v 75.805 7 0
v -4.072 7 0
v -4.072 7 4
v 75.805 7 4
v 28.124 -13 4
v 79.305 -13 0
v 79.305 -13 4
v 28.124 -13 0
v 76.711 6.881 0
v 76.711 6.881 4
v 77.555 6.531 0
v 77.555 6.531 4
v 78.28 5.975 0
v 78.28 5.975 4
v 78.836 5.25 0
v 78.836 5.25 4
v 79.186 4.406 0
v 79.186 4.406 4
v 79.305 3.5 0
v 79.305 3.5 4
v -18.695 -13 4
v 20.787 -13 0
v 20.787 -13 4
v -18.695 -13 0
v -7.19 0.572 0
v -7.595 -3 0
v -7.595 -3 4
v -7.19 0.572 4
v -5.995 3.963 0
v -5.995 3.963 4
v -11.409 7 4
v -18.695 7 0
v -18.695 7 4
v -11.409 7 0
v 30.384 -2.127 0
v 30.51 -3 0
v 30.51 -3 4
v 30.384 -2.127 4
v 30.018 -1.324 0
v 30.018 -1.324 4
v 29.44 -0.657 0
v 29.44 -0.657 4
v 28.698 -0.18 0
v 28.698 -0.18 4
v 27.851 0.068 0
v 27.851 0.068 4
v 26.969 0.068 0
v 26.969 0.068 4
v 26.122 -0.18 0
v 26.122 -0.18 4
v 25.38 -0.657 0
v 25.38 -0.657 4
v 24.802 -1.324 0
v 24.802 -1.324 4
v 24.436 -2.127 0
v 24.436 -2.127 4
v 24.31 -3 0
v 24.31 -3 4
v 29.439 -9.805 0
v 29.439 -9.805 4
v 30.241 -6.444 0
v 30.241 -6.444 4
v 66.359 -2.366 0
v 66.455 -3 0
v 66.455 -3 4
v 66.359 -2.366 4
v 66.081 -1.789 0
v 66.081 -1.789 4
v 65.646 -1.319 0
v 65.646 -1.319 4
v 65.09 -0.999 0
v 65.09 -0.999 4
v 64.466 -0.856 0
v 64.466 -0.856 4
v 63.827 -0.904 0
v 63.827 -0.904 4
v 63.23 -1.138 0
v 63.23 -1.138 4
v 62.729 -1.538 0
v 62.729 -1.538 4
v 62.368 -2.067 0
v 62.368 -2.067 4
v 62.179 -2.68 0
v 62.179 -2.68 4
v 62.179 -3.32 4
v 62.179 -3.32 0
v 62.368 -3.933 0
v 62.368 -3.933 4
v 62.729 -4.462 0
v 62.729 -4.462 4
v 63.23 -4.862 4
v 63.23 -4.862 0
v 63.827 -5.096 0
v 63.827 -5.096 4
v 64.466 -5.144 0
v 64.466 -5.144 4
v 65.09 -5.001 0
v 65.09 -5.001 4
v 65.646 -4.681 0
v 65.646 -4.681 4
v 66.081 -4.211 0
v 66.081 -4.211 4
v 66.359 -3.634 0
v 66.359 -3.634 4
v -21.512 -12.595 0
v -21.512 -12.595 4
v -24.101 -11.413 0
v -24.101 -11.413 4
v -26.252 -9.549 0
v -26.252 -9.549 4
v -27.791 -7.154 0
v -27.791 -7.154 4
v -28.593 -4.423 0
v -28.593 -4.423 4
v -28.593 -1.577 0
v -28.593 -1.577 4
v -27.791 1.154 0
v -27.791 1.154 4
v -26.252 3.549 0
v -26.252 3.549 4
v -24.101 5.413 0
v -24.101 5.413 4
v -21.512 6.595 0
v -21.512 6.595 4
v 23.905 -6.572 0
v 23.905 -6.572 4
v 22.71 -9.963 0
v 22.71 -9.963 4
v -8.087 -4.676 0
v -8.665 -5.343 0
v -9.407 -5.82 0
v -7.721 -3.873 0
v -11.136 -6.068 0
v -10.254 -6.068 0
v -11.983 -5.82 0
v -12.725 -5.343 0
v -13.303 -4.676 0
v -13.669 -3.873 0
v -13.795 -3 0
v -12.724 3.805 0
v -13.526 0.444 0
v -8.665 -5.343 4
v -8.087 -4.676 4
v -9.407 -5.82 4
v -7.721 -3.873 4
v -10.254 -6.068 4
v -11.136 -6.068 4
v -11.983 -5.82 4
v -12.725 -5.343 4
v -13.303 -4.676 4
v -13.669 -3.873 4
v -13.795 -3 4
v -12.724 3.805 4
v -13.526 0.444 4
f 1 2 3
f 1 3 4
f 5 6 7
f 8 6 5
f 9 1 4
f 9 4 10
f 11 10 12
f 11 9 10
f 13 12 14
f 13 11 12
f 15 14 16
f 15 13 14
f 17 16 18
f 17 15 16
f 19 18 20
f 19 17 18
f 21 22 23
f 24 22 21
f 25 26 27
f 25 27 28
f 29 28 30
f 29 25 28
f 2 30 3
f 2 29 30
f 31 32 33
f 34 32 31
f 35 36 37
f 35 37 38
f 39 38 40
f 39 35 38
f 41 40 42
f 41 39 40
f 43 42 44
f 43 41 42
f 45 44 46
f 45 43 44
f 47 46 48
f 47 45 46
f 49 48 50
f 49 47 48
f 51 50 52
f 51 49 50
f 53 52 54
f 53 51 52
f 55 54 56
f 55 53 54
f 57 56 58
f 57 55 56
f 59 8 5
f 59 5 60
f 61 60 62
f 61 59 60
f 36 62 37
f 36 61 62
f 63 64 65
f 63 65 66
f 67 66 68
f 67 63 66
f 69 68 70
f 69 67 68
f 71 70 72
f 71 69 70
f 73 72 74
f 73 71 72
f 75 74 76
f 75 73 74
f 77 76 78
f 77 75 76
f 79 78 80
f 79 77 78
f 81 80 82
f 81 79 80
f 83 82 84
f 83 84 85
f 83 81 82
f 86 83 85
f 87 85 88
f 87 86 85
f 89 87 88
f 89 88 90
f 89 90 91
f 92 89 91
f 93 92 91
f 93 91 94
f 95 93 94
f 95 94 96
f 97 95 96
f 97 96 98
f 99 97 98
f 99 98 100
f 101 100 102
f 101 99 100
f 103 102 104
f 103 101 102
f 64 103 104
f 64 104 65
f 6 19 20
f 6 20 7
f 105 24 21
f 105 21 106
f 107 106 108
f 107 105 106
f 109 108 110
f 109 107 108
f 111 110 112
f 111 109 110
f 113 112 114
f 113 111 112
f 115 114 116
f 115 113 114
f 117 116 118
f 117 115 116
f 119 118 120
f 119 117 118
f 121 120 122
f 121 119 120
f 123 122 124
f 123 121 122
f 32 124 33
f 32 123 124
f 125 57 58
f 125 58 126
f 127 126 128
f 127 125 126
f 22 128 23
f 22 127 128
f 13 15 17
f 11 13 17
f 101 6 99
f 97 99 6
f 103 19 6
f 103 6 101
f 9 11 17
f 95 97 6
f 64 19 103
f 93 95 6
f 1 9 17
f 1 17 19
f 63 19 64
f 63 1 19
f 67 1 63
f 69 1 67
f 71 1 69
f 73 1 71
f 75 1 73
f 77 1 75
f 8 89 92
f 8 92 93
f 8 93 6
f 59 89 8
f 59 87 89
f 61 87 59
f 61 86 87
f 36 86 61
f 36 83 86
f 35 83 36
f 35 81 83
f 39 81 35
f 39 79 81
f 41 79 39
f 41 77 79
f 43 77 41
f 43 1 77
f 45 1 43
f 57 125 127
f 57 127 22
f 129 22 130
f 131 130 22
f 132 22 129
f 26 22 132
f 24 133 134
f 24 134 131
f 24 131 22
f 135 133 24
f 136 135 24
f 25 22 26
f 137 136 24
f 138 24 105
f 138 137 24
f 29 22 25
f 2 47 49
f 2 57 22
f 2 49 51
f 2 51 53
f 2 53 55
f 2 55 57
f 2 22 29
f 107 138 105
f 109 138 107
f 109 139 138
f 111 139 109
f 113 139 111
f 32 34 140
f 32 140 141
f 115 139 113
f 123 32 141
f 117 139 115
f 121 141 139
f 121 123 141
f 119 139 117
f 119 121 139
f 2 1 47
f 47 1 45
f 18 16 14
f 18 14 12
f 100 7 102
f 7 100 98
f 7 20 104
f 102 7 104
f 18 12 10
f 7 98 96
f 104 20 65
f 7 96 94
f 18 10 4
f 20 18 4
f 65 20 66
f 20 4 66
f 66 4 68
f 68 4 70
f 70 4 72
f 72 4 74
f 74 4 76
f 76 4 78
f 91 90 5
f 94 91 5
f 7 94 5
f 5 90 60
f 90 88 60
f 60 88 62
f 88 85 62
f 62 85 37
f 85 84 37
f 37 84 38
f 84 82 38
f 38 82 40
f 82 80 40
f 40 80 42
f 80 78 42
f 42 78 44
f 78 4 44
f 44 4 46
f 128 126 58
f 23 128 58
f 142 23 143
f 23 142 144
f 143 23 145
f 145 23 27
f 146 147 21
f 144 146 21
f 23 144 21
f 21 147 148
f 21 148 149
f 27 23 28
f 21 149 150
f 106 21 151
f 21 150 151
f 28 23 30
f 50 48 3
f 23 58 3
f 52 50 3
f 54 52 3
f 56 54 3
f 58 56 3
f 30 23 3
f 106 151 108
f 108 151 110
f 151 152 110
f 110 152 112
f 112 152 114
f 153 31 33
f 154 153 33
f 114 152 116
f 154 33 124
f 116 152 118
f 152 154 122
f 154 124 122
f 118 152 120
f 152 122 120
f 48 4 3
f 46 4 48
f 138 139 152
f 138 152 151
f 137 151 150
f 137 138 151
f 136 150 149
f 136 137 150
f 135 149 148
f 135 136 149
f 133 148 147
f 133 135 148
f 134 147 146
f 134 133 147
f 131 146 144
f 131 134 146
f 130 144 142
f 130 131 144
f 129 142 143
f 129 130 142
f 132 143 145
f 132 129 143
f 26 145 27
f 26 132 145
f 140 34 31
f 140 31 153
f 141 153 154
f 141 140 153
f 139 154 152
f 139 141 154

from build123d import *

# Parameters (mm, degrees)
SKETCH1_R           = 2.15
BOSS_EXTRUDE1_DEPTH = 4


with BuildPart() as part:
    # Sketch1 → Boss-Extrude1 (new body)
    with BuildSketch(Plane.XY):
        with BuildLine():
            Line((20.7866022, -13), (-18.694986916, -13))
            ThreePointArc((-18.694986916, -13), (-28.694986916, -3), (-18.694986916, 7))
            Line((-18.694986916, 7), (-11.409460793, 7))
            ThreePointArc((-11.409460793, 7), (-13.190353922, 2.140299964), (-13.794986916, -3))
            ThreePointArc((-13.794986916, -3), (-10.694986916, -6.1), (-7.594986916, -3))
            ThreePointArc((-7.594986916, -3), (-6.688371741, 2.301283436), (-4.071576031, 7))
            Line((-4.071576031, 7), (75.805013084, 7))
            ThreePointArc((75.805013084, 7), (78.279886819, 5.974873734), (79.305013084, 3.5))
            Line((79.305013084, 3.5), (79.305013084, -13))
            Line((79.305013084, -13), (28.124486961, -13))
            ThreePointArc((28.124486961, -13), (29.905380091, -8.140299964), (30.510013084, -3))
            ThreePointArc((30.510013084, -3), (27.410013084, 0.1), (24.310013084, -3))
            ThreePointArc((24.310013084, -3), (23.40339791, -8.301283436), (20.7866022, -13))
        make_face()
        with Locations((64.305013084, -3)):
            Circle(SKETCH1_R, mode=Mode.SUBTRACT)
    extrude(amount=BOSS_EXTRUDE1_DEPTH)


solid = part.part
